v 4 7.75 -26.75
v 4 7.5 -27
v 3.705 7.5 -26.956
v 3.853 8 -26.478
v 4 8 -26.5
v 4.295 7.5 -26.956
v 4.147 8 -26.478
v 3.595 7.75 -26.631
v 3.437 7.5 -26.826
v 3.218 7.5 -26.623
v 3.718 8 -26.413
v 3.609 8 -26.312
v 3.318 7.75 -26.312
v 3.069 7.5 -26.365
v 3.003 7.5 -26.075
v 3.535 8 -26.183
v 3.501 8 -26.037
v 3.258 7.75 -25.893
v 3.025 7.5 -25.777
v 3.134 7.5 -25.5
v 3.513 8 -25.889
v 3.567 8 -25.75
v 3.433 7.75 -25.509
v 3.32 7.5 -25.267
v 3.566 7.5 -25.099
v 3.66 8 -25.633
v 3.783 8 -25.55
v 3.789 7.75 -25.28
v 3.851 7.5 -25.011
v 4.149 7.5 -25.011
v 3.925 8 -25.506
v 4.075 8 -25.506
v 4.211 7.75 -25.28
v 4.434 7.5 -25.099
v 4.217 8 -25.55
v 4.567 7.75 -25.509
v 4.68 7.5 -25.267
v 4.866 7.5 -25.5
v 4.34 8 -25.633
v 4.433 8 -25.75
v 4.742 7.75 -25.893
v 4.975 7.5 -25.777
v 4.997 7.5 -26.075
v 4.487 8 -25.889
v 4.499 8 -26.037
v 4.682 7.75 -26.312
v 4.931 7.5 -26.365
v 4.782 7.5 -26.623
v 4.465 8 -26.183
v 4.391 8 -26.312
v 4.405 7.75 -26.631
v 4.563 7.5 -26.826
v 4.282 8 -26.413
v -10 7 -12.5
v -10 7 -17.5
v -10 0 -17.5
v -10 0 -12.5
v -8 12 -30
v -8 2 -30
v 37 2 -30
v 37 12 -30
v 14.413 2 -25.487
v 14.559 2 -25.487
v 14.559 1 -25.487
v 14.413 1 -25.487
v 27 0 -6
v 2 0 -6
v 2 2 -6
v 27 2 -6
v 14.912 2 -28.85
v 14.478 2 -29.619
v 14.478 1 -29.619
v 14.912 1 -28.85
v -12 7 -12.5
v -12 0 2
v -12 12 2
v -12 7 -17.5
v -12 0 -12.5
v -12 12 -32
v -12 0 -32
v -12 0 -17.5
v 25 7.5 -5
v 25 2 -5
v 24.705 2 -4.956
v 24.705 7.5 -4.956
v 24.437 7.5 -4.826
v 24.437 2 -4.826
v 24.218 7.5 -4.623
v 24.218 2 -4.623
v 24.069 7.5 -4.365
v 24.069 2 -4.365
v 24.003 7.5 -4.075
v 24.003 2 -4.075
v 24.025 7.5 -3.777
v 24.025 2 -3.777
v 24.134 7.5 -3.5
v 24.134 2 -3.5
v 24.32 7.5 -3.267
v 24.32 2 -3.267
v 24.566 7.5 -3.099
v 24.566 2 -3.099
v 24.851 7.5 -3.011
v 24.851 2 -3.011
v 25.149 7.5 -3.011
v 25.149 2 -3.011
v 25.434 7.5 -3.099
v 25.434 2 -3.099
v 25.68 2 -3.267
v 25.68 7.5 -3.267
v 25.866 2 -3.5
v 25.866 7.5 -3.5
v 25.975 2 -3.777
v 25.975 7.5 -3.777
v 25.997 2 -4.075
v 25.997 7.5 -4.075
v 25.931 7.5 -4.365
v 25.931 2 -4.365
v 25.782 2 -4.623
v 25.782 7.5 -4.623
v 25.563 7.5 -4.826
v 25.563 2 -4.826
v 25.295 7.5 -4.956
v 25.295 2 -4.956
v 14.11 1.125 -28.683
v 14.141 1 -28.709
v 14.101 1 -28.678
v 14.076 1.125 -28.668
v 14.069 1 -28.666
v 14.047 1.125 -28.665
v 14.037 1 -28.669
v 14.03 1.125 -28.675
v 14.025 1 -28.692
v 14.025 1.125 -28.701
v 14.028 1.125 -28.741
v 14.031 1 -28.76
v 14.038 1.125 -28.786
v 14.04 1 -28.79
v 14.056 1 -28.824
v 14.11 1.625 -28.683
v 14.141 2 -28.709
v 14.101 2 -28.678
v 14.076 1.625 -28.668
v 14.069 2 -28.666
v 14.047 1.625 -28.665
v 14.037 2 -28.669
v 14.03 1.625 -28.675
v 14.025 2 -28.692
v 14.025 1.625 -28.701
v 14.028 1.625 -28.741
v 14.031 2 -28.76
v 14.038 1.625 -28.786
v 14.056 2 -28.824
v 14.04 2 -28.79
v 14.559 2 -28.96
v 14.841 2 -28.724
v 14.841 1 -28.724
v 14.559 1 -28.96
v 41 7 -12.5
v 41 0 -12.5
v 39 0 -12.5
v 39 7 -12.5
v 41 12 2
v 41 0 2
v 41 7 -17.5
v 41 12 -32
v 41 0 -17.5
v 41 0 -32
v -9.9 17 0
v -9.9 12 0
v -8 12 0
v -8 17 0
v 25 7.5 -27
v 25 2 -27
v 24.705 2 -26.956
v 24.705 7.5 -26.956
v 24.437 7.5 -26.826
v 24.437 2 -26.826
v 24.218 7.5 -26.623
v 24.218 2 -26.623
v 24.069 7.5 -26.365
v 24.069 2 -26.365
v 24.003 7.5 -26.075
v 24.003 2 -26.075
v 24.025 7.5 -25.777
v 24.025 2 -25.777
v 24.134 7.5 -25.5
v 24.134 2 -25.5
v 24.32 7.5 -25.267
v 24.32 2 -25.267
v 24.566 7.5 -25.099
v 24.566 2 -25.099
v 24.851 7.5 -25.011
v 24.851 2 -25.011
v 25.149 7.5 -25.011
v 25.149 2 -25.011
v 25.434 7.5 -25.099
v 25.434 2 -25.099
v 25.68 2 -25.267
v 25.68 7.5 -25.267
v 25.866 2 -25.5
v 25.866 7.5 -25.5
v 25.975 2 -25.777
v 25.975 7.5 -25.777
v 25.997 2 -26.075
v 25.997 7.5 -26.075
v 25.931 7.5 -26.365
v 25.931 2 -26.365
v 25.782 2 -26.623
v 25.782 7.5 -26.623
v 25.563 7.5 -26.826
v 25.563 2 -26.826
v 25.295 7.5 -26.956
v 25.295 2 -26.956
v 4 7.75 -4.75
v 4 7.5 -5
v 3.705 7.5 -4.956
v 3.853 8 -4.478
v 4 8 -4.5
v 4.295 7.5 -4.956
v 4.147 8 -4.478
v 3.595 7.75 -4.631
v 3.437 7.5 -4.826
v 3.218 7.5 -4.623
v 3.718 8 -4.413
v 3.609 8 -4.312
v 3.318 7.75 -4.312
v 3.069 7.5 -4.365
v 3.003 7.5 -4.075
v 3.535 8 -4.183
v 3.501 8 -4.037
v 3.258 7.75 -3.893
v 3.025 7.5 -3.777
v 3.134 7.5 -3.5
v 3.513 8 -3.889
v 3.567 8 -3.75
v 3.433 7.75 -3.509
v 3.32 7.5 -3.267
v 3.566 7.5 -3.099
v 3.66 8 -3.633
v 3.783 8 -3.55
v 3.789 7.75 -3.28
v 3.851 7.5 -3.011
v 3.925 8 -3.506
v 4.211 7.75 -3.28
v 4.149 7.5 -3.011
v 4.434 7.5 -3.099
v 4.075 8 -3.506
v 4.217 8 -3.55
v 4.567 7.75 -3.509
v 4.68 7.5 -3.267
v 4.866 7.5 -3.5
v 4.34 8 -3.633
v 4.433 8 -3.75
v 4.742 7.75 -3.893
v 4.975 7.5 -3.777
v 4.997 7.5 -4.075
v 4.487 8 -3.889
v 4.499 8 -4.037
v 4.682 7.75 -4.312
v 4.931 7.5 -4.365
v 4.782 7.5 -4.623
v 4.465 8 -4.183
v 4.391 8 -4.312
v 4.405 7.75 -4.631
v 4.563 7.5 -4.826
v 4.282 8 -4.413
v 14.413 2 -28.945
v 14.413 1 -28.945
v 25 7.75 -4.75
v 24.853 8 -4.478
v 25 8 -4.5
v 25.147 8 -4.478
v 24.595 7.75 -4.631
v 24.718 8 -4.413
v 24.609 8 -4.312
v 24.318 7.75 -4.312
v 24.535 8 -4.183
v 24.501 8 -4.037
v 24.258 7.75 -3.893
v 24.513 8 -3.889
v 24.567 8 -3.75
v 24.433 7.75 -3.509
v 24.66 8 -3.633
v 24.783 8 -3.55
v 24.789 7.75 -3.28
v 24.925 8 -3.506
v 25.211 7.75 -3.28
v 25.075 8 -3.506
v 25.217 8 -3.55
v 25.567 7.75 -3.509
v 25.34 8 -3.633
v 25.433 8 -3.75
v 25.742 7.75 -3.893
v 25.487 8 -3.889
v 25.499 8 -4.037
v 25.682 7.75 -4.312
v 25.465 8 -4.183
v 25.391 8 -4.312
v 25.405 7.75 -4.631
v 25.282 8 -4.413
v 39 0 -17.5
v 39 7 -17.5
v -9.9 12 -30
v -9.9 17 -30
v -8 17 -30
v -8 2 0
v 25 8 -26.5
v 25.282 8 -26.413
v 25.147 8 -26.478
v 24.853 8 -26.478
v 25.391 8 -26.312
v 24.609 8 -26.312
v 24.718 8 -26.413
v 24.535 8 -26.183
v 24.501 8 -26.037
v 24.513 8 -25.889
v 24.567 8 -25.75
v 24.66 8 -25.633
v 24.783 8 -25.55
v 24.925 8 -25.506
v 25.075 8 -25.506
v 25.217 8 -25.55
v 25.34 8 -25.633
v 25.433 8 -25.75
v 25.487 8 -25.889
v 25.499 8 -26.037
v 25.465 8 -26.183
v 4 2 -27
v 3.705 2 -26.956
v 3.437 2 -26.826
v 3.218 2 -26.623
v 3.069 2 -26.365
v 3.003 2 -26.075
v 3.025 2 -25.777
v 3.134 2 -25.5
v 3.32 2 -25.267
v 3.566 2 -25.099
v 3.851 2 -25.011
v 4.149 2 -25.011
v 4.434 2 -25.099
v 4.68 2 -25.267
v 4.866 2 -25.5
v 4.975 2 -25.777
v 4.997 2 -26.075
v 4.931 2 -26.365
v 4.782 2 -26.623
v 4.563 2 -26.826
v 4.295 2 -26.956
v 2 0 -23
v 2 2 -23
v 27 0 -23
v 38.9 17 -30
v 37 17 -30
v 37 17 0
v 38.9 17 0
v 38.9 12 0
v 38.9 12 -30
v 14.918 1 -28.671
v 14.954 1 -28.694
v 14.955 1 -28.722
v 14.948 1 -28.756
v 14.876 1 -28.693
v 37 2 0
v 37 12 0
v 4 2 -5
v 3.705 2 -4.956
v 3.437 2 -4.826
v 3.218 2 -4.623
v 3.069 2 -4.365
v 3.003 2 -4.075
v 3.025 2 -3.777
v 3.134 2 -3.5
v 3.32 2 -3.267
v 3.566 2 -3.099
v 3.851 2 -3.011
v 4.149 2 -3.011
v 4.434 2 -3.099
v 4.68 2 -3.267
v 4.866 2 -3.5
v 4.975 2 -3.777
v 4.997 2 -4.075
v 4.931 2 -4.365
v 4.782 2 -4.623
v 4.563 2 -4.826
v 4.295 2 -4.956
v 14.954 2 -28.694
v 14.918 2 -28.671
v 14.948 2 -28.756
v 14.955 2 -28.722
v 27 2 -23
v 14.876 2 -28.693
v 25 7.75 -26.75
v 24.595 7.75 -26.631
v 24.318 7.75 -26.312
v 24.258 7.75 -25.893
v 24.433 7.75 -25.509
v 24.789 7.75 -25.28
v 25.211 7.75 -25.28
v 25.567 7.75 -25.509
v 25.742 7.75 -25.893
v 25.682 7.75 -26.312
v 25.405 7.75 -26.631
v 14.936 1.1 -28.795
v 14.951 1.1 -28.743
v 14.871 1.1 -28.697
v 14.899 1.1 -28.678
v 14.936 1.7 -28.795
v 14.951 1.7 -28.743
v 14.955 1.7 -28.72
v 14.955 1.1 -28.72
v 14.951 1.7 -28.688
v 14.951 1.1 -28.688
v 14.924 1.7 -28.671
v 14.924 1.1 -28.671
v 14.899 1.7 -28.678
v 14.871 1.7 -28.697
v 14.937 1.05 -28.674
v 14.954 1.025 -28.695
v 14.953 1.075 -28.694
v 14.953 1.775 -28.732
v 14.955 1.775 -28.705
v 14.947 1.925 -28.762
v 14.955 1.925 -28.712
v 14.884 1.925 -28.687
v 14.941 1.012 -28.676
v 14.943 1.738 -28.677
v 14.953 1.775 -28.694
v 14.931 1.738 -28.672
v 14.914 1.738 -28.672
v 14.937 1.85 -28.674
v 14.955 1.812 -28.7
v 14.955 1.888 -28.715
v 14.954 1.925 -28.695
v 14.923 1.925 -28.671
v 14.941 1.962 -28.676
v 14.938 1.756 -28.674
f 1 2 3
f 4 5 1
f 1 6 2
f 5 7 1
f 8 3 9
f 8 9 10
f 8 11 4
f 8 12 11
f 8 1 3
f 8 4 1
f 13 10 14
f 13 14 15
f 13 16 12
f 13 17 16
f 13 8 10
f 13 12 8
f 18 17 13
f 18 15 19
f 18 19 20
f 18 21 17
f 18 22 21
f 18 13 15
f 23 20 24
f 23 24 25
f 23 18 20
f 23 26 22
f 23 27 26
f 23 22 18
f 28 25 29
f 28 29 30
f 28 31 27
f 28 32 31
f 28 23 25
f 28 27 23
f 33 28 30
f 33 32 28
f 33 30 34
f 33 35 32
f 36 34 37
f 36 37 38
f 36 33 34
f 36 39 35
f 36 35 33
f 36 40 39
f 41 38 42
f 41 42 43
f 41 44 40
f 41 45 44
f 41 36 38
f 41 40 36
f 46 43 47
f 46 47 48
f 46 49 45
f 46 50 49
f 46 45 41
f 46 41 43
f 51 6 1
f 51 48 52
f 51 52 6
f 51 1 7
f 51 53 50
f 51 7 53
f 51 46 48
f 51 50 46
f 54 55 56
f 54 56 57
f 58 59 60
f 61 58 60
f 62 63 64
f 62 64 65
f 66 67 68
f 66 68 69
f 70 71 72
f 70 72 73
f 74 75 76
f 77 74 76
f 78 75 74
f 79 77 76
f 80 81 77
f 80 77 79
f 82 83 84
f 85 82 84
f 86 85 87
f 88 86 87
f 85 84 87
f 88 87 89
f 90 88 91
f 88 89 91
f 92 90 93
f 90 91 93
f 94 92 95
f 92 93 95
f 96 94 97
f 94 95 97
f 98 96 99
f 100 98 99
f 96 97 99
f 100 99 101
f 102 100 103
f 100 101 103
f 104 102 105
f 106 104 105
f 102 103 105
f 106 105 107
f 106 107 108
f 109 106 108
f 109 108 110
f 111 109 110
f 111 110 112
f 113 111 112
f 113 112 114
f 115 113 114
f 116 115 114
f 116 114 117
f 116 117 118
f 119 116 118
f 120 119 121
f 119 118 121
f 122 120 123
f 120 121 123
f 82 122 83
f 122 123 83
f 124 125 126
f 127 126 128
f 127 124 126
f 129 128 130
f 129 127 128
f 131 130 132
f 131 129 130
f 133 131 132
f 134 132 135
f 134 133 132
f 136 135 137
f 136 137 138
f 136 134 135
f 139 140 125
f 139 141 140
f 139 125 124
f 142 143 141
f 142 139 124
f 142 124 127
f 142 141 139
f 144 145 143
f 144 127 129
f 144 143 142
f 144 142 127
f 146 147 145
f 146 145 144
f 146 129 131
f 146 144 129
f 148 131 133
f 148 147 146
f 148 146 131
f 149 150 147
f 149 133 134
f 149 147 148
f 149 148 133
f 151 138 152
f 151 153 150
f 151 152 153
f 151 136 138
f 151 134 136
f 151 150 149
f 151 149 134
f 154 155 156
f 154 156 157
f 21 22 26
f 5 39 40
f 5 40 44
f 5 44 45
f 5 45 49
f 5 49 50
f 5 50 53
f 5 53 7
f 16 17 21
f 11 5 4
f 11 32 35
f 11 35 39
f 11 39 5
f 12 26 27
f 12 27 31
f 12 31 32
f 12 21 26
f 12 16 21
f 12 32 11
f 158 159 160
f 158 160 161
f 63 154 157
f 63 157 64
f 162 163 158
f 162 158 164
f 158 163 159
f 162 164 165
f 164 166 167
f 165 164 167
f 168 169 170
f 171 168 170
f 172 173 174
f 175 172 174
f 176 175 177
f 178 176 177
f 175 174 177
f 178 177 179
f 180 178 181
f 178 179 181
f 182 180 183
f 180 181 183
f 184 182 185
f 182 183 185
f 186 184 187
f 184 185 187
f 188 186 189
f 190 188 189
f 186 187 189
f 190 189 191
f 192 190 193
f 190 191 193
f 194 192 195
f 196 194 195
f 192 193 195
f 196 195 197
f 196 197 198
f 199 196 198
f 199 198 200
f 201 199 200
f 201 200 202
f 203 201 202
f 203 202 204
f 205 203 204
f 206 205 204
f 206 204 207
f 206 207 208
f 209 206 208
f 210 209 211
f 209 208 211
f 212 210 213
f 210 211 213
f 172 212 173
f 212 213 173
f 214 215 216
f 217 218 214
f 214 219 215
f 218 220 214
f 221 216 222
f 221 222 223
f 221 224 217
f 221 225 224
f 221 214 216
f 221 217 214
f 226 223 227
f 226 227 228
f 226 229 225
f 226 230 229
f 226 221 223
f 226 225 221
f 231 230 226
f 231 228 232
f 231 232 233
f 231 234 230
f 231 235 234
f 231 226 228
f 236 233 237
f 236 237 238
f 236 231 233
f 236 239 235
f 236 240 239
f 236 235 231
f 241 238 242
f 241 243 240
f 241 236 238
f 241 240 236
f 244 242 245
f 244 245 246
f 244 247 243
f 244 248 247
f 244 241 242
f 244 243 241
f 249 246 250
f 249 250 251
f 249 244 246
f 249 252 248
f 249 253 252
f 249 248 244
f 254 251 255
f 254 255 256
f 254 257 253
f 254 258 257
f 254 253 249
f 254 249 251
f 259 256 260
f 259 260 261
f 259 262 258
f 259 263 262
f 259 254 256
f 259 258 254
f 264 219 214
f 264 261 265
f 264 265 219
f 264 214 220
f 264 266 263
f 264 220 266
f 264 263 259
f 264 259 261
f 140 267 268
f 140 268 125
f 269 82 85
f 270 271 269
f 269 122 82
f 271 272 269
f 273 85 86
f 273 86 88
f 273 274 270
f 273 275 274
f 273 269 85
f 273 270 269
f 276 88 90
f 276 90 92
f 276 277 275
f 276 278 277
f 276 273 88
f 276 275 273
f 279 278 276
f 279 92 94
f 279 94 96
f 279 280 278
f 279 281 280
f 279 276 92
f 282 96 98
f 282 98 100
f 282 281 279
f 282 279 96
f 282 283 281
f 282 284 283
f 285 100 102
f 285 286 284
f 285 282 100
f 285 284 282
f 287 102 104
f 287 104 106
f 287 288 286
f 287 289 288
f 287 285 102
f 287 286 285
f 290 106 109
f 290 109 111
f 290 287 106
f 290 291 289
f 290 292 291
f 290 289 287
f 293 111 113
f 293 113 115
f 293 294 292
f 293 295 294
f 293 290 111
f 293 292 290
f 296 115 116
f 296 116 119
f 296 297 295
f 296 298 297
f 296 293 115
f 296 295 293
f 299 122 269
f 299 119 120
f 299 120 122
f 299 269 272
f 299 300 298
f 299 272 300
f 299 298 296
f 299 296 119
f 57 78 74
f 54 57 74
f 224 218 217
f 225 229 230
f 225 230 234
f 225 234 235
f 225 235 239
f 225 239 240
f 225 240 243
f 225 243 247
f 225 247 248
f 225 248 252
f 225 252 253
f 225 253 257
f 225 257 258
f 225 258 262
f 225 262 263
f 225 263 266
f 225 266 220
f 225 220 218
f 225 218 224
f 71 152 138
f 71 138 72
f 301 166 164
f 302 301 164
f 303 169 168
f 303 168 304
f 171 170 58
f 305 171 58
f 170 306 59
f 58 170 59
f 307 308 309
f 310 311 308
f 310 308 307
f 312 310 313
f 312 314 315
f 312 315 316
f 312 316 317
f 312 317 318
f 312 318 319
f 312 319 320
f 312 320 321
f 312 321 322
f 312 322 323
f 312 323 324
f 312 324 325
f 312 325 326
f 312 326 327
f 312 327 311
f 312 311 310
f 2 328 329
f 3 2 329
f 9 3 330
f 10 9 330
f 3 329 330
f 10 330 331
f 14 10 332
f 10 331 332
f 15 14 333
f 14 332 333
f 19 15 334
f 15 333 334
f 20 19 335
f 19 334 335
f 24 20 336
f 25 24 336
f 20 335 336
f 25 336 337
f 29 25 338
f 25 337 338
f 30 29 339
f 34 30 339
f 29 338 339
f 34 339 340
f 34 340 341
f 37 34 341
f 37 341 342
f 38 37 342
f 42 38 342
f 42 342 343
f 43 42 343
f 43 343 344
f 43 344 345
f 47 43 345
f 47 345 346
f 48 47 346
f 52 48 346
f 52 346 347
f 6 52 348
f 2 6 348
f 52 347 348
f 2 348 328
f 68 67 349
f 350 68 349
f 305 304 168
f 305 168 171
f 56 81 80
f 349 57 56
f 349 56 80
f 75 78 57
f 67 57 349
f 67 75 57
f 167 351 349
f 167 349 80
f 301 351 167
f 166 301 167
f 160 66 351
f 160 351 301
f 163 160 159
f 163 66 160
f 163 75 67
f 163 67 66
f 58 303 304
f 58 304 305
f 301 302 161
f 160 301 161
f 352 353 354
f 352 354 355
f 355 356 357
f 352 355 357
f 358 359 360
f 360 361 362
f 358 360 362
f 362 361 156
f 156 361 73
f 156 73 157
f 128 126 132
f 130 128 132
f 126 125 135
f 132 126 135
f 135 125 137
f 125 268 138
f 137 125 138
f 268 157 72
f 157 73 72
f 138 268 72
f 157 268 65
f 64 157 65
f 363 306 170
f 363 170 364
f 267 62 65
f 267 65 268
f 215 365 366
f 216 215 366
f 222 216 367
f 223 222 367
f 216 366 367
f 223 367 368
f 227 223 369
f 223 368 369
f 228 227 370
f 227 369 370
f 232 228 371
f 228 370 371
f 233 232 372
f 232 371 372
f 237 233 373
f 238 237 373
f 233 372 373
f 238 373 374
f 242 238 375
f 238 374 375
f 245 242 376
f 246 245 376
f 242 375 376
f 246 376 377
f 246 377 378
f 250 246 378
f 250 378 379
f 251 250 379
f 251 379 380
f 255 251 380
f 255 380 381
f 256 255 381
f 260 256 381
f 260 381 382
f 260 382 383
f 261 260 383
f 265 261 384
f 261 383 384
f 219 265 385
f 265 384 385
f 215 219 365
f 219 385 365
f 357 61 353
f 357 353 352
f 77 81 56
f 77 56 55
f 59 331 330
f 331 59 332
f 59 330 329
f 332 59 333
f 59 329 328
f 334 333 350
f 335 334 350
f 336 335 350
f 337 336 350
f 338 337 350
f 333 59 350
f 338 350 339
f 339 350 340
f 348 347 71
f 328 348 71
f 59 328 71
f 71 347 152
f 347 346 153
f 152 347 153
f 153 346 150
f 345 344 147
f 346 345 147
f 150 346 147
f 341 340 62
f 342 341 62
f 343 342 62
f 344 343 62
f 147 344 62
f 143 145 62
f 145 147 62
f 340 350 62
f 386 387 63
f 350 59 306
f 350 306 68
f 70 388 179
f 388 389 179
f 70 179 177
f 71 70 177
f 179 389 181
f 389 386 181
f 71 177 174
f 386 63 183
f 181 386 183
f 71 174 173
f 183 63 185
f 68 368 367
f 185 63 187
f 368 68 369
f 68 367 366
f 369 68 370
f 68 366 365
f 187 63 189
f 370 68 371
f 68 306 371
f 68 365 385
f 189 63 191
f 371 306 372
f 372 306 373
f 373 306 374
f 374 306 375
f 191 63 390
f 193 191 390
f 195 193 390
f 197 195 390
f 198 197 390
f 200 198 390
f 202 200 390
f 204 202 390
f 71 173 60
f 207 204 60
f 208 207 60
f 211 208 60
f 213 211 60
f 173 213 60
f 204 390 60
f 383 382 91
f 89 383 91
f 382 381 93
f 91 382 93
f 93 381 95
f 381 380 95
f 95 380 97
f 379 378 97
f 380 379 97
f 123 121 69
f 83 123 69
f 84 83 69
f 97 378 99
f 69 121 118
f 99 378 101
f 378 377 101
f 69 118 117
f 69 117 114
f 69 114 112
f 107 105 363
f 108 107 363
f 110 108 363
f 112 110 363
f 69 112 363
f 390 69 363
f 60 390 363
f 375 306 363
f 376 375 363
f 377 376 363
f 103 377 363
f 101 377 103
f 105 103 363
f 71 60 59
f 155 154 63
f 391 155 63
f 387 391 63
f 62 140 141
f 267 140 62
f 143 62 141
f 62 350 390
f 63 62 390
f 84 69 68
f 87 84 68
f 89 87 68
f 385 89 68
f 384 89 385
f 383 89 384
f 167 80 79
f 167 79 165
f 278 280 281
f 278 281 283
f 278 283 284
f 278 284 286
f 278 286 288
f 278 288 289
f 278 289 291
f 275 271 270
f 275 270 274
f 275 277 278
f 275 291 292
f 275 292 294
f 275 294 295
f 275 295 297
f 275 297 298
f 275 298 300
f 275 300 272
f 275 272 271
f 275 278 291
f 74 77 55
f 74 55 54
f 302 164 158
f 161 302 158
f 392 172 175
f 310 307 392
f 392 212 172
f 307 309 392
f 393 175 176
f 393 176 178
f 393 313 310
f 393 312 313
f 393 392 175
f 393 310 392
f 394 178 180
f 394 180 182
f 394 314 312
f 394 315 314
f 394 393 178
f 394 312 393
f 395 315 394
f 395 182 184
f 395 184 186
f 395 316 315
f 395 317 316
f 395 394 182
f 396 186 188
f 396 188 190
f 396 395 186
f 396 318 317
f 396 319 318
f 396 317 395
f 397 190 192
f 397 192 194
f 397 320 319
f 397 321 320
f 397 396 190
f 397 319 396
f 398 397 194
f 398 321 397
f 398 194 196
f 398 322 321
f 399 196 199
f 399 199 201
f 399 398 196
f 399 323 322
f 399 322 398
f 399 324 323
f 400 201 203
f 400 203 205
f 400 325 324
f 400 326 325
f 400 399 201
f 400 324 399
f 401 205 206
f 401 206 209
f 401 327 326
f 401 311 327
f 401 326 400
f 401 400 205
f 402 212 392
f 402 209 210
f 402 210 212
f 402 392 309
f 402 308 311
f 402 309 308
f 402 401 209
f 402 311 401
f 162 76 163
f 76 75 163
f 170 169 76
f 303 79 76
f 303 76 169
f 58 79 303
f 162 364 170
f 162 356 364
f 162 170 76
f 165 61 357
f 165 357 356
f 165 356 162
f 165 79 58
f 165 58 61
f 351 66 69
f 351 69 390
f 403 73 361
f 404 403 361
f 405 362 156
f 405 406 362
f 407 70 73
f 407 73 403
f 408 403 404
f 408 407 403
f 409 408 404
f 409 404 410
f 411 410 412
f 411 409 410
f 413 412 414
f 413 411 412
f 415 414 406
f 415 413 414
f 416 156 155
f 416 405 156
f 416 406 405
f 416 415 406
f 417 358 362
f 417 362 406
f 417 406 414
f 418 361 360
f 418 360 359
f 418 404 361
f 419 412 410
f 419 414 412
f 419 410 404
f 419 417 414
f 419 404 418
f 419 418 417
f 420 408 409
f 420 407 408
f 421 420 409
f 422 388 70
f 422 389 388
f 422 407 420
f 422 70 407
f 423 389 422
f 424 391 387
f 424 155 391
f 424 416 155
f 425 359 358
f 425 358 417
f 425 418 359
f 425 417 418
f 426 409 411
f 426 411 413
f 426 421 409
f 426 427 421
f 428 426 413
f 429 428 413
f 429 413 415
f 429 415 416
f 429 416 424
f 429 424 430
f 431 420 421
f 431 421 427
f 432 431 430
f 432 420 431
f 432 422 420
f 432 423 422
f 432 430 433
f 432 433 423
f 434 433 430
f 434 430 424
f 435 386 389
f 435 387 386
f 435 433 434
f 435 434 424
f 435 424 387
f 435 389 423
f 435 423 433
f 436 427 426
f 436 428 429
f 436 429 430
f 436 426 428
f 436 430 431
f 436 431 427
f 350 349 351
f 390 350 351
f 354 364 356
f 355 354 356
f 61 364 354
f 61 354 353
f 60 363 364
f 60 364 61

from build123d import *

# Parameters (mm, degrees)
SKETCH_1_W                         = 29
SKETCH_1_H                         = 30
SKETCH_1_W_2                       = 25
SKETCH_1_H_2                       = 17
EXTRUDE_1_DEPTH                    = 2
SKETCH_4_R                         = 1
EXTRUDE_2_DEPTH                    = 6
CHAMFER_1_SIZE                     = 0.5
PATTERN_LINEAR_1_COUNT             = 2
PATTERN_LINEAR_1_PITCH             = 21
PATTERN_LINEAR_1_COUNT_DIR2        = 2
PATTERN_LINEAR_1_PITCH_DIR2        = 22
CHAMFER_1_OF_PATTERN_LINEAR_1_SIZE = 0.5
SKETCH_5_W                         = 53
SKETCH_5_H                         = 34
SKETCH_5_W_2                       = 29
SKETCH_5_H_2                       = 30
EXTRUDE_3_DEPTH                    = 2
SKETCH_6_W                         = 53
SKETCH_6_H                         = 34
SKETCH_6_W_2                       = 45
SKETCH_6_H_2                       = 30
EXTRUDE_4_DEPTH                    = 10
SKETCH_7_W                         = 1.9
SKETCH_7_H                         = 30
EXTRUDE_5_DEPTH                    = 5
SKETCH_8_W                         = 5
SKETCH_8_H                         = 7
CUT_EXTRUDE_1_DEPTH                = 2
CUT_EXTRUDE_2_DEPTH                = 1


with BuildPart() as part:
    # 草图1 → 凸台-拉伸1 (new body)
    with BuildSketch(Plane(origin=(0, 0, 0), x_dir=(1, 0, 0), z_dir=(0, 1, 0))):
        with Locations((14.5, 15)):
            Rectangle(SKETCH_1_W, SKETCH_1_H)
        with Locations((14.5, 14.5)):
            Rectangle(SKETCH_1_W_2, SKETCH_1_H_2, mode=Mode.SUBTRACT)
    extrude(amount=EXTRUDE_1_DEPTH)

    # 草图4 → 凸台-拉伸2 (add)
    with BuildSketch(Plane(origin=(0, 2, 0), x_dir=(1, 0, 0), z_dir=(0, 1, 0))):
        with Locations(Location((4, 26, 0), (0, 0, 90))):
            Circle(SKETCH_4_R)
    extrude_2 = extrude(amount=EXTRUDE_2_DEPTH)

    # 倒角1
    chamfer_1_edges = [part.edges().sort_by_distance(p)[0] for p in [
        (4, 8, -25),
    ]]
    chamfer(chamfer_1_edges, length=CHAMFER_1_SIZE)

    # 阵列(线性)1: Extrude 2 2 × 2
    with Locations(*[(i * PATTERN_LINEAR_1_PITCH, 0, j * PATTERN_LINEAR_1_PITCH_DIR2) for i in range(PATTERN_LINEAR_1_COUNT) for j in range(PATTERN_LINEAR_1_COUNT_DIR2) if (i, j) != (0, 0)]):
        add(extrude_2)

    # 倒角1 of 阵列(线性)1
    chamfer_1_of_pattern_linear_1_edges = [part.edges().sort_by_distance(p)[0] for p in [
        (4, 8, -3),
        (25, 8, -25),
        (25, 8, -3),
    ]]
    chamfer(chamfer_1_of_pattern_linear_1_edges, length=CHAMFER_1_OF_PATTERN_LINEAR_1_SIZE)

    # 草图5 → 凸台-拉伸3 (add)
    with BuildSketch(Plane.XZ):
        with Locations((14.5, -15)):
            Rectangle(SKETCH_5_W, SKETCH_5_H)
        with Locations((14.5, -15)):
            Rectangle(SKETCH_5_W_2, SKETCH_5_H_2, mode=Mode.SUBTRACT)
    extrude(amount=-EXTRUDE_3_DEPTH)

    # 草图6 → 凸台-拉伸4 (add)
    with BuildSketch(Plane(origin=(0, 2, 0), x_dir=(1, 0, 0), z_dir=(0, 1, 0))):
        with Locations((14.5, 15)):
            Rectangle(SKETCH_6_W, SKETCH_6_H)
        with Locations((14.5, 15)):
            Rectangle(SKETCH_6_W_2, SKETCH_6_H_2, mode=Mode.SUBTRACT)
    extrude(amount=EXTRUDE_4_DEPTH)

    # 草图7 → 凸台-拉伸5 (add)
    with BuildSketch(Plane(origin=(0, 12, 0), x_dir=(1, 0, 0), z_dir=(0, 1, 0))):
        with Locations((-8.95, 15)):
            Rectangle(SKETCH_7_W, SKETCH_7_H)
        with Locations((37.95, 15)):
            Rectangle(SKETCH_7_W, SKETCH_7_H)
    extrude(amount=EXTRUDE_5_DEPTH)

    # 草图8 → 切除-拉伸1 (cut)
    with BuildSketch(Plane.ZY.offset(12)):
        with Locations((-15, 3.5)):
            Rectangle(SKETCH_8_W, SKETCH_8_H)
    cut_extrude_1 = extrude(amount=-CUT_EXTRUDE_1_DEPTH, mode=Mode.SUBTRACT)

    # 草图9 → 切除-拉伸2 (cut)
    with BuildSketch(Plane(origin=(0, 2, 0), x_dir=(1, 0, 0), z_dir=(0, 1, 0))):
        with BuildLine():
            Line((14.558917537, 25.486895376), (14.412742382, 25.486895376))
            Line((14.412742382, 25.486895376), (14.412742382, 28.945131046))
            Line((14.412742382, 28.945131046), (14.141274238, 28.708715108))
            add(Edge.make_bspline(
                [(14.141274238, 28.708715108), (14.131226678, 28.699624795), (14.111776808, 28.682027946), (14.078955395, 28.667696389), (14.049596625, 28.660757409), (14.025482894, 28.674909055), (14.024334353, 28.706256057), (14.027312724, 28.742599315), (14.035982745, 28.785479878), (14.049247389, 28.811861074), (14.055508204, 28.824312806)],
                knots=[0, 0, 0, 0, 1.145827462, 2.218070327, 3.049383638, 3.602329049, 4.338402789, 5.486582277, 6.813685142, 8, 8, 8, 8], degree=3))
            Line((14.055508204, 28.824312806), (14.478372043, 29.619326657))
            Line((14.478372043, 29.619326657), (14.911676966, 28.849669721))
            add(Edge.make_bspline(
                [(14.911676966, 28.849669721), (14.920492206, 28.831763899), (14.93731818, 28.7975864), (14.949542857, 28.753205391), (14.955311509, 28.721793647), (14.95568764, 28.70307516), (14.95245501, 28.688159671), (14.942591019, 28.675147665), (14.922248283, 28.667540916), (14.896003584, 28.678587323), (14.868455455, 28.697222198), (14.850537253, 28.714349218), (14.840826763, 28.72363094)],
                knots=[0, 0, 0, 0, 1.968558185, 3.757459298, 4.529049772, 5.118788489, 5.601560465, 6.004578554, 6.689087708, 7.559937433, 8.677646168, 10, 10, 10, 10], degree=3))
            Line((14.840826763, 28.72363094), (14.558917537, 28.960046878))
            Line((14.558917537, 28.960046878), (14.558917537, 25.486895376))
        make_face()
    extrude(amount=-CUT_EXTRUDE_2_DEPTH, mode=Mode.SUBTRACT)

    # 镜向1: 切除-拉伸1 across plane
    add(cut_extrude_1.mirror(Plane.ZY.offset(-14.5)), mode=Mode.SUBTRACT)


solid = part.part
